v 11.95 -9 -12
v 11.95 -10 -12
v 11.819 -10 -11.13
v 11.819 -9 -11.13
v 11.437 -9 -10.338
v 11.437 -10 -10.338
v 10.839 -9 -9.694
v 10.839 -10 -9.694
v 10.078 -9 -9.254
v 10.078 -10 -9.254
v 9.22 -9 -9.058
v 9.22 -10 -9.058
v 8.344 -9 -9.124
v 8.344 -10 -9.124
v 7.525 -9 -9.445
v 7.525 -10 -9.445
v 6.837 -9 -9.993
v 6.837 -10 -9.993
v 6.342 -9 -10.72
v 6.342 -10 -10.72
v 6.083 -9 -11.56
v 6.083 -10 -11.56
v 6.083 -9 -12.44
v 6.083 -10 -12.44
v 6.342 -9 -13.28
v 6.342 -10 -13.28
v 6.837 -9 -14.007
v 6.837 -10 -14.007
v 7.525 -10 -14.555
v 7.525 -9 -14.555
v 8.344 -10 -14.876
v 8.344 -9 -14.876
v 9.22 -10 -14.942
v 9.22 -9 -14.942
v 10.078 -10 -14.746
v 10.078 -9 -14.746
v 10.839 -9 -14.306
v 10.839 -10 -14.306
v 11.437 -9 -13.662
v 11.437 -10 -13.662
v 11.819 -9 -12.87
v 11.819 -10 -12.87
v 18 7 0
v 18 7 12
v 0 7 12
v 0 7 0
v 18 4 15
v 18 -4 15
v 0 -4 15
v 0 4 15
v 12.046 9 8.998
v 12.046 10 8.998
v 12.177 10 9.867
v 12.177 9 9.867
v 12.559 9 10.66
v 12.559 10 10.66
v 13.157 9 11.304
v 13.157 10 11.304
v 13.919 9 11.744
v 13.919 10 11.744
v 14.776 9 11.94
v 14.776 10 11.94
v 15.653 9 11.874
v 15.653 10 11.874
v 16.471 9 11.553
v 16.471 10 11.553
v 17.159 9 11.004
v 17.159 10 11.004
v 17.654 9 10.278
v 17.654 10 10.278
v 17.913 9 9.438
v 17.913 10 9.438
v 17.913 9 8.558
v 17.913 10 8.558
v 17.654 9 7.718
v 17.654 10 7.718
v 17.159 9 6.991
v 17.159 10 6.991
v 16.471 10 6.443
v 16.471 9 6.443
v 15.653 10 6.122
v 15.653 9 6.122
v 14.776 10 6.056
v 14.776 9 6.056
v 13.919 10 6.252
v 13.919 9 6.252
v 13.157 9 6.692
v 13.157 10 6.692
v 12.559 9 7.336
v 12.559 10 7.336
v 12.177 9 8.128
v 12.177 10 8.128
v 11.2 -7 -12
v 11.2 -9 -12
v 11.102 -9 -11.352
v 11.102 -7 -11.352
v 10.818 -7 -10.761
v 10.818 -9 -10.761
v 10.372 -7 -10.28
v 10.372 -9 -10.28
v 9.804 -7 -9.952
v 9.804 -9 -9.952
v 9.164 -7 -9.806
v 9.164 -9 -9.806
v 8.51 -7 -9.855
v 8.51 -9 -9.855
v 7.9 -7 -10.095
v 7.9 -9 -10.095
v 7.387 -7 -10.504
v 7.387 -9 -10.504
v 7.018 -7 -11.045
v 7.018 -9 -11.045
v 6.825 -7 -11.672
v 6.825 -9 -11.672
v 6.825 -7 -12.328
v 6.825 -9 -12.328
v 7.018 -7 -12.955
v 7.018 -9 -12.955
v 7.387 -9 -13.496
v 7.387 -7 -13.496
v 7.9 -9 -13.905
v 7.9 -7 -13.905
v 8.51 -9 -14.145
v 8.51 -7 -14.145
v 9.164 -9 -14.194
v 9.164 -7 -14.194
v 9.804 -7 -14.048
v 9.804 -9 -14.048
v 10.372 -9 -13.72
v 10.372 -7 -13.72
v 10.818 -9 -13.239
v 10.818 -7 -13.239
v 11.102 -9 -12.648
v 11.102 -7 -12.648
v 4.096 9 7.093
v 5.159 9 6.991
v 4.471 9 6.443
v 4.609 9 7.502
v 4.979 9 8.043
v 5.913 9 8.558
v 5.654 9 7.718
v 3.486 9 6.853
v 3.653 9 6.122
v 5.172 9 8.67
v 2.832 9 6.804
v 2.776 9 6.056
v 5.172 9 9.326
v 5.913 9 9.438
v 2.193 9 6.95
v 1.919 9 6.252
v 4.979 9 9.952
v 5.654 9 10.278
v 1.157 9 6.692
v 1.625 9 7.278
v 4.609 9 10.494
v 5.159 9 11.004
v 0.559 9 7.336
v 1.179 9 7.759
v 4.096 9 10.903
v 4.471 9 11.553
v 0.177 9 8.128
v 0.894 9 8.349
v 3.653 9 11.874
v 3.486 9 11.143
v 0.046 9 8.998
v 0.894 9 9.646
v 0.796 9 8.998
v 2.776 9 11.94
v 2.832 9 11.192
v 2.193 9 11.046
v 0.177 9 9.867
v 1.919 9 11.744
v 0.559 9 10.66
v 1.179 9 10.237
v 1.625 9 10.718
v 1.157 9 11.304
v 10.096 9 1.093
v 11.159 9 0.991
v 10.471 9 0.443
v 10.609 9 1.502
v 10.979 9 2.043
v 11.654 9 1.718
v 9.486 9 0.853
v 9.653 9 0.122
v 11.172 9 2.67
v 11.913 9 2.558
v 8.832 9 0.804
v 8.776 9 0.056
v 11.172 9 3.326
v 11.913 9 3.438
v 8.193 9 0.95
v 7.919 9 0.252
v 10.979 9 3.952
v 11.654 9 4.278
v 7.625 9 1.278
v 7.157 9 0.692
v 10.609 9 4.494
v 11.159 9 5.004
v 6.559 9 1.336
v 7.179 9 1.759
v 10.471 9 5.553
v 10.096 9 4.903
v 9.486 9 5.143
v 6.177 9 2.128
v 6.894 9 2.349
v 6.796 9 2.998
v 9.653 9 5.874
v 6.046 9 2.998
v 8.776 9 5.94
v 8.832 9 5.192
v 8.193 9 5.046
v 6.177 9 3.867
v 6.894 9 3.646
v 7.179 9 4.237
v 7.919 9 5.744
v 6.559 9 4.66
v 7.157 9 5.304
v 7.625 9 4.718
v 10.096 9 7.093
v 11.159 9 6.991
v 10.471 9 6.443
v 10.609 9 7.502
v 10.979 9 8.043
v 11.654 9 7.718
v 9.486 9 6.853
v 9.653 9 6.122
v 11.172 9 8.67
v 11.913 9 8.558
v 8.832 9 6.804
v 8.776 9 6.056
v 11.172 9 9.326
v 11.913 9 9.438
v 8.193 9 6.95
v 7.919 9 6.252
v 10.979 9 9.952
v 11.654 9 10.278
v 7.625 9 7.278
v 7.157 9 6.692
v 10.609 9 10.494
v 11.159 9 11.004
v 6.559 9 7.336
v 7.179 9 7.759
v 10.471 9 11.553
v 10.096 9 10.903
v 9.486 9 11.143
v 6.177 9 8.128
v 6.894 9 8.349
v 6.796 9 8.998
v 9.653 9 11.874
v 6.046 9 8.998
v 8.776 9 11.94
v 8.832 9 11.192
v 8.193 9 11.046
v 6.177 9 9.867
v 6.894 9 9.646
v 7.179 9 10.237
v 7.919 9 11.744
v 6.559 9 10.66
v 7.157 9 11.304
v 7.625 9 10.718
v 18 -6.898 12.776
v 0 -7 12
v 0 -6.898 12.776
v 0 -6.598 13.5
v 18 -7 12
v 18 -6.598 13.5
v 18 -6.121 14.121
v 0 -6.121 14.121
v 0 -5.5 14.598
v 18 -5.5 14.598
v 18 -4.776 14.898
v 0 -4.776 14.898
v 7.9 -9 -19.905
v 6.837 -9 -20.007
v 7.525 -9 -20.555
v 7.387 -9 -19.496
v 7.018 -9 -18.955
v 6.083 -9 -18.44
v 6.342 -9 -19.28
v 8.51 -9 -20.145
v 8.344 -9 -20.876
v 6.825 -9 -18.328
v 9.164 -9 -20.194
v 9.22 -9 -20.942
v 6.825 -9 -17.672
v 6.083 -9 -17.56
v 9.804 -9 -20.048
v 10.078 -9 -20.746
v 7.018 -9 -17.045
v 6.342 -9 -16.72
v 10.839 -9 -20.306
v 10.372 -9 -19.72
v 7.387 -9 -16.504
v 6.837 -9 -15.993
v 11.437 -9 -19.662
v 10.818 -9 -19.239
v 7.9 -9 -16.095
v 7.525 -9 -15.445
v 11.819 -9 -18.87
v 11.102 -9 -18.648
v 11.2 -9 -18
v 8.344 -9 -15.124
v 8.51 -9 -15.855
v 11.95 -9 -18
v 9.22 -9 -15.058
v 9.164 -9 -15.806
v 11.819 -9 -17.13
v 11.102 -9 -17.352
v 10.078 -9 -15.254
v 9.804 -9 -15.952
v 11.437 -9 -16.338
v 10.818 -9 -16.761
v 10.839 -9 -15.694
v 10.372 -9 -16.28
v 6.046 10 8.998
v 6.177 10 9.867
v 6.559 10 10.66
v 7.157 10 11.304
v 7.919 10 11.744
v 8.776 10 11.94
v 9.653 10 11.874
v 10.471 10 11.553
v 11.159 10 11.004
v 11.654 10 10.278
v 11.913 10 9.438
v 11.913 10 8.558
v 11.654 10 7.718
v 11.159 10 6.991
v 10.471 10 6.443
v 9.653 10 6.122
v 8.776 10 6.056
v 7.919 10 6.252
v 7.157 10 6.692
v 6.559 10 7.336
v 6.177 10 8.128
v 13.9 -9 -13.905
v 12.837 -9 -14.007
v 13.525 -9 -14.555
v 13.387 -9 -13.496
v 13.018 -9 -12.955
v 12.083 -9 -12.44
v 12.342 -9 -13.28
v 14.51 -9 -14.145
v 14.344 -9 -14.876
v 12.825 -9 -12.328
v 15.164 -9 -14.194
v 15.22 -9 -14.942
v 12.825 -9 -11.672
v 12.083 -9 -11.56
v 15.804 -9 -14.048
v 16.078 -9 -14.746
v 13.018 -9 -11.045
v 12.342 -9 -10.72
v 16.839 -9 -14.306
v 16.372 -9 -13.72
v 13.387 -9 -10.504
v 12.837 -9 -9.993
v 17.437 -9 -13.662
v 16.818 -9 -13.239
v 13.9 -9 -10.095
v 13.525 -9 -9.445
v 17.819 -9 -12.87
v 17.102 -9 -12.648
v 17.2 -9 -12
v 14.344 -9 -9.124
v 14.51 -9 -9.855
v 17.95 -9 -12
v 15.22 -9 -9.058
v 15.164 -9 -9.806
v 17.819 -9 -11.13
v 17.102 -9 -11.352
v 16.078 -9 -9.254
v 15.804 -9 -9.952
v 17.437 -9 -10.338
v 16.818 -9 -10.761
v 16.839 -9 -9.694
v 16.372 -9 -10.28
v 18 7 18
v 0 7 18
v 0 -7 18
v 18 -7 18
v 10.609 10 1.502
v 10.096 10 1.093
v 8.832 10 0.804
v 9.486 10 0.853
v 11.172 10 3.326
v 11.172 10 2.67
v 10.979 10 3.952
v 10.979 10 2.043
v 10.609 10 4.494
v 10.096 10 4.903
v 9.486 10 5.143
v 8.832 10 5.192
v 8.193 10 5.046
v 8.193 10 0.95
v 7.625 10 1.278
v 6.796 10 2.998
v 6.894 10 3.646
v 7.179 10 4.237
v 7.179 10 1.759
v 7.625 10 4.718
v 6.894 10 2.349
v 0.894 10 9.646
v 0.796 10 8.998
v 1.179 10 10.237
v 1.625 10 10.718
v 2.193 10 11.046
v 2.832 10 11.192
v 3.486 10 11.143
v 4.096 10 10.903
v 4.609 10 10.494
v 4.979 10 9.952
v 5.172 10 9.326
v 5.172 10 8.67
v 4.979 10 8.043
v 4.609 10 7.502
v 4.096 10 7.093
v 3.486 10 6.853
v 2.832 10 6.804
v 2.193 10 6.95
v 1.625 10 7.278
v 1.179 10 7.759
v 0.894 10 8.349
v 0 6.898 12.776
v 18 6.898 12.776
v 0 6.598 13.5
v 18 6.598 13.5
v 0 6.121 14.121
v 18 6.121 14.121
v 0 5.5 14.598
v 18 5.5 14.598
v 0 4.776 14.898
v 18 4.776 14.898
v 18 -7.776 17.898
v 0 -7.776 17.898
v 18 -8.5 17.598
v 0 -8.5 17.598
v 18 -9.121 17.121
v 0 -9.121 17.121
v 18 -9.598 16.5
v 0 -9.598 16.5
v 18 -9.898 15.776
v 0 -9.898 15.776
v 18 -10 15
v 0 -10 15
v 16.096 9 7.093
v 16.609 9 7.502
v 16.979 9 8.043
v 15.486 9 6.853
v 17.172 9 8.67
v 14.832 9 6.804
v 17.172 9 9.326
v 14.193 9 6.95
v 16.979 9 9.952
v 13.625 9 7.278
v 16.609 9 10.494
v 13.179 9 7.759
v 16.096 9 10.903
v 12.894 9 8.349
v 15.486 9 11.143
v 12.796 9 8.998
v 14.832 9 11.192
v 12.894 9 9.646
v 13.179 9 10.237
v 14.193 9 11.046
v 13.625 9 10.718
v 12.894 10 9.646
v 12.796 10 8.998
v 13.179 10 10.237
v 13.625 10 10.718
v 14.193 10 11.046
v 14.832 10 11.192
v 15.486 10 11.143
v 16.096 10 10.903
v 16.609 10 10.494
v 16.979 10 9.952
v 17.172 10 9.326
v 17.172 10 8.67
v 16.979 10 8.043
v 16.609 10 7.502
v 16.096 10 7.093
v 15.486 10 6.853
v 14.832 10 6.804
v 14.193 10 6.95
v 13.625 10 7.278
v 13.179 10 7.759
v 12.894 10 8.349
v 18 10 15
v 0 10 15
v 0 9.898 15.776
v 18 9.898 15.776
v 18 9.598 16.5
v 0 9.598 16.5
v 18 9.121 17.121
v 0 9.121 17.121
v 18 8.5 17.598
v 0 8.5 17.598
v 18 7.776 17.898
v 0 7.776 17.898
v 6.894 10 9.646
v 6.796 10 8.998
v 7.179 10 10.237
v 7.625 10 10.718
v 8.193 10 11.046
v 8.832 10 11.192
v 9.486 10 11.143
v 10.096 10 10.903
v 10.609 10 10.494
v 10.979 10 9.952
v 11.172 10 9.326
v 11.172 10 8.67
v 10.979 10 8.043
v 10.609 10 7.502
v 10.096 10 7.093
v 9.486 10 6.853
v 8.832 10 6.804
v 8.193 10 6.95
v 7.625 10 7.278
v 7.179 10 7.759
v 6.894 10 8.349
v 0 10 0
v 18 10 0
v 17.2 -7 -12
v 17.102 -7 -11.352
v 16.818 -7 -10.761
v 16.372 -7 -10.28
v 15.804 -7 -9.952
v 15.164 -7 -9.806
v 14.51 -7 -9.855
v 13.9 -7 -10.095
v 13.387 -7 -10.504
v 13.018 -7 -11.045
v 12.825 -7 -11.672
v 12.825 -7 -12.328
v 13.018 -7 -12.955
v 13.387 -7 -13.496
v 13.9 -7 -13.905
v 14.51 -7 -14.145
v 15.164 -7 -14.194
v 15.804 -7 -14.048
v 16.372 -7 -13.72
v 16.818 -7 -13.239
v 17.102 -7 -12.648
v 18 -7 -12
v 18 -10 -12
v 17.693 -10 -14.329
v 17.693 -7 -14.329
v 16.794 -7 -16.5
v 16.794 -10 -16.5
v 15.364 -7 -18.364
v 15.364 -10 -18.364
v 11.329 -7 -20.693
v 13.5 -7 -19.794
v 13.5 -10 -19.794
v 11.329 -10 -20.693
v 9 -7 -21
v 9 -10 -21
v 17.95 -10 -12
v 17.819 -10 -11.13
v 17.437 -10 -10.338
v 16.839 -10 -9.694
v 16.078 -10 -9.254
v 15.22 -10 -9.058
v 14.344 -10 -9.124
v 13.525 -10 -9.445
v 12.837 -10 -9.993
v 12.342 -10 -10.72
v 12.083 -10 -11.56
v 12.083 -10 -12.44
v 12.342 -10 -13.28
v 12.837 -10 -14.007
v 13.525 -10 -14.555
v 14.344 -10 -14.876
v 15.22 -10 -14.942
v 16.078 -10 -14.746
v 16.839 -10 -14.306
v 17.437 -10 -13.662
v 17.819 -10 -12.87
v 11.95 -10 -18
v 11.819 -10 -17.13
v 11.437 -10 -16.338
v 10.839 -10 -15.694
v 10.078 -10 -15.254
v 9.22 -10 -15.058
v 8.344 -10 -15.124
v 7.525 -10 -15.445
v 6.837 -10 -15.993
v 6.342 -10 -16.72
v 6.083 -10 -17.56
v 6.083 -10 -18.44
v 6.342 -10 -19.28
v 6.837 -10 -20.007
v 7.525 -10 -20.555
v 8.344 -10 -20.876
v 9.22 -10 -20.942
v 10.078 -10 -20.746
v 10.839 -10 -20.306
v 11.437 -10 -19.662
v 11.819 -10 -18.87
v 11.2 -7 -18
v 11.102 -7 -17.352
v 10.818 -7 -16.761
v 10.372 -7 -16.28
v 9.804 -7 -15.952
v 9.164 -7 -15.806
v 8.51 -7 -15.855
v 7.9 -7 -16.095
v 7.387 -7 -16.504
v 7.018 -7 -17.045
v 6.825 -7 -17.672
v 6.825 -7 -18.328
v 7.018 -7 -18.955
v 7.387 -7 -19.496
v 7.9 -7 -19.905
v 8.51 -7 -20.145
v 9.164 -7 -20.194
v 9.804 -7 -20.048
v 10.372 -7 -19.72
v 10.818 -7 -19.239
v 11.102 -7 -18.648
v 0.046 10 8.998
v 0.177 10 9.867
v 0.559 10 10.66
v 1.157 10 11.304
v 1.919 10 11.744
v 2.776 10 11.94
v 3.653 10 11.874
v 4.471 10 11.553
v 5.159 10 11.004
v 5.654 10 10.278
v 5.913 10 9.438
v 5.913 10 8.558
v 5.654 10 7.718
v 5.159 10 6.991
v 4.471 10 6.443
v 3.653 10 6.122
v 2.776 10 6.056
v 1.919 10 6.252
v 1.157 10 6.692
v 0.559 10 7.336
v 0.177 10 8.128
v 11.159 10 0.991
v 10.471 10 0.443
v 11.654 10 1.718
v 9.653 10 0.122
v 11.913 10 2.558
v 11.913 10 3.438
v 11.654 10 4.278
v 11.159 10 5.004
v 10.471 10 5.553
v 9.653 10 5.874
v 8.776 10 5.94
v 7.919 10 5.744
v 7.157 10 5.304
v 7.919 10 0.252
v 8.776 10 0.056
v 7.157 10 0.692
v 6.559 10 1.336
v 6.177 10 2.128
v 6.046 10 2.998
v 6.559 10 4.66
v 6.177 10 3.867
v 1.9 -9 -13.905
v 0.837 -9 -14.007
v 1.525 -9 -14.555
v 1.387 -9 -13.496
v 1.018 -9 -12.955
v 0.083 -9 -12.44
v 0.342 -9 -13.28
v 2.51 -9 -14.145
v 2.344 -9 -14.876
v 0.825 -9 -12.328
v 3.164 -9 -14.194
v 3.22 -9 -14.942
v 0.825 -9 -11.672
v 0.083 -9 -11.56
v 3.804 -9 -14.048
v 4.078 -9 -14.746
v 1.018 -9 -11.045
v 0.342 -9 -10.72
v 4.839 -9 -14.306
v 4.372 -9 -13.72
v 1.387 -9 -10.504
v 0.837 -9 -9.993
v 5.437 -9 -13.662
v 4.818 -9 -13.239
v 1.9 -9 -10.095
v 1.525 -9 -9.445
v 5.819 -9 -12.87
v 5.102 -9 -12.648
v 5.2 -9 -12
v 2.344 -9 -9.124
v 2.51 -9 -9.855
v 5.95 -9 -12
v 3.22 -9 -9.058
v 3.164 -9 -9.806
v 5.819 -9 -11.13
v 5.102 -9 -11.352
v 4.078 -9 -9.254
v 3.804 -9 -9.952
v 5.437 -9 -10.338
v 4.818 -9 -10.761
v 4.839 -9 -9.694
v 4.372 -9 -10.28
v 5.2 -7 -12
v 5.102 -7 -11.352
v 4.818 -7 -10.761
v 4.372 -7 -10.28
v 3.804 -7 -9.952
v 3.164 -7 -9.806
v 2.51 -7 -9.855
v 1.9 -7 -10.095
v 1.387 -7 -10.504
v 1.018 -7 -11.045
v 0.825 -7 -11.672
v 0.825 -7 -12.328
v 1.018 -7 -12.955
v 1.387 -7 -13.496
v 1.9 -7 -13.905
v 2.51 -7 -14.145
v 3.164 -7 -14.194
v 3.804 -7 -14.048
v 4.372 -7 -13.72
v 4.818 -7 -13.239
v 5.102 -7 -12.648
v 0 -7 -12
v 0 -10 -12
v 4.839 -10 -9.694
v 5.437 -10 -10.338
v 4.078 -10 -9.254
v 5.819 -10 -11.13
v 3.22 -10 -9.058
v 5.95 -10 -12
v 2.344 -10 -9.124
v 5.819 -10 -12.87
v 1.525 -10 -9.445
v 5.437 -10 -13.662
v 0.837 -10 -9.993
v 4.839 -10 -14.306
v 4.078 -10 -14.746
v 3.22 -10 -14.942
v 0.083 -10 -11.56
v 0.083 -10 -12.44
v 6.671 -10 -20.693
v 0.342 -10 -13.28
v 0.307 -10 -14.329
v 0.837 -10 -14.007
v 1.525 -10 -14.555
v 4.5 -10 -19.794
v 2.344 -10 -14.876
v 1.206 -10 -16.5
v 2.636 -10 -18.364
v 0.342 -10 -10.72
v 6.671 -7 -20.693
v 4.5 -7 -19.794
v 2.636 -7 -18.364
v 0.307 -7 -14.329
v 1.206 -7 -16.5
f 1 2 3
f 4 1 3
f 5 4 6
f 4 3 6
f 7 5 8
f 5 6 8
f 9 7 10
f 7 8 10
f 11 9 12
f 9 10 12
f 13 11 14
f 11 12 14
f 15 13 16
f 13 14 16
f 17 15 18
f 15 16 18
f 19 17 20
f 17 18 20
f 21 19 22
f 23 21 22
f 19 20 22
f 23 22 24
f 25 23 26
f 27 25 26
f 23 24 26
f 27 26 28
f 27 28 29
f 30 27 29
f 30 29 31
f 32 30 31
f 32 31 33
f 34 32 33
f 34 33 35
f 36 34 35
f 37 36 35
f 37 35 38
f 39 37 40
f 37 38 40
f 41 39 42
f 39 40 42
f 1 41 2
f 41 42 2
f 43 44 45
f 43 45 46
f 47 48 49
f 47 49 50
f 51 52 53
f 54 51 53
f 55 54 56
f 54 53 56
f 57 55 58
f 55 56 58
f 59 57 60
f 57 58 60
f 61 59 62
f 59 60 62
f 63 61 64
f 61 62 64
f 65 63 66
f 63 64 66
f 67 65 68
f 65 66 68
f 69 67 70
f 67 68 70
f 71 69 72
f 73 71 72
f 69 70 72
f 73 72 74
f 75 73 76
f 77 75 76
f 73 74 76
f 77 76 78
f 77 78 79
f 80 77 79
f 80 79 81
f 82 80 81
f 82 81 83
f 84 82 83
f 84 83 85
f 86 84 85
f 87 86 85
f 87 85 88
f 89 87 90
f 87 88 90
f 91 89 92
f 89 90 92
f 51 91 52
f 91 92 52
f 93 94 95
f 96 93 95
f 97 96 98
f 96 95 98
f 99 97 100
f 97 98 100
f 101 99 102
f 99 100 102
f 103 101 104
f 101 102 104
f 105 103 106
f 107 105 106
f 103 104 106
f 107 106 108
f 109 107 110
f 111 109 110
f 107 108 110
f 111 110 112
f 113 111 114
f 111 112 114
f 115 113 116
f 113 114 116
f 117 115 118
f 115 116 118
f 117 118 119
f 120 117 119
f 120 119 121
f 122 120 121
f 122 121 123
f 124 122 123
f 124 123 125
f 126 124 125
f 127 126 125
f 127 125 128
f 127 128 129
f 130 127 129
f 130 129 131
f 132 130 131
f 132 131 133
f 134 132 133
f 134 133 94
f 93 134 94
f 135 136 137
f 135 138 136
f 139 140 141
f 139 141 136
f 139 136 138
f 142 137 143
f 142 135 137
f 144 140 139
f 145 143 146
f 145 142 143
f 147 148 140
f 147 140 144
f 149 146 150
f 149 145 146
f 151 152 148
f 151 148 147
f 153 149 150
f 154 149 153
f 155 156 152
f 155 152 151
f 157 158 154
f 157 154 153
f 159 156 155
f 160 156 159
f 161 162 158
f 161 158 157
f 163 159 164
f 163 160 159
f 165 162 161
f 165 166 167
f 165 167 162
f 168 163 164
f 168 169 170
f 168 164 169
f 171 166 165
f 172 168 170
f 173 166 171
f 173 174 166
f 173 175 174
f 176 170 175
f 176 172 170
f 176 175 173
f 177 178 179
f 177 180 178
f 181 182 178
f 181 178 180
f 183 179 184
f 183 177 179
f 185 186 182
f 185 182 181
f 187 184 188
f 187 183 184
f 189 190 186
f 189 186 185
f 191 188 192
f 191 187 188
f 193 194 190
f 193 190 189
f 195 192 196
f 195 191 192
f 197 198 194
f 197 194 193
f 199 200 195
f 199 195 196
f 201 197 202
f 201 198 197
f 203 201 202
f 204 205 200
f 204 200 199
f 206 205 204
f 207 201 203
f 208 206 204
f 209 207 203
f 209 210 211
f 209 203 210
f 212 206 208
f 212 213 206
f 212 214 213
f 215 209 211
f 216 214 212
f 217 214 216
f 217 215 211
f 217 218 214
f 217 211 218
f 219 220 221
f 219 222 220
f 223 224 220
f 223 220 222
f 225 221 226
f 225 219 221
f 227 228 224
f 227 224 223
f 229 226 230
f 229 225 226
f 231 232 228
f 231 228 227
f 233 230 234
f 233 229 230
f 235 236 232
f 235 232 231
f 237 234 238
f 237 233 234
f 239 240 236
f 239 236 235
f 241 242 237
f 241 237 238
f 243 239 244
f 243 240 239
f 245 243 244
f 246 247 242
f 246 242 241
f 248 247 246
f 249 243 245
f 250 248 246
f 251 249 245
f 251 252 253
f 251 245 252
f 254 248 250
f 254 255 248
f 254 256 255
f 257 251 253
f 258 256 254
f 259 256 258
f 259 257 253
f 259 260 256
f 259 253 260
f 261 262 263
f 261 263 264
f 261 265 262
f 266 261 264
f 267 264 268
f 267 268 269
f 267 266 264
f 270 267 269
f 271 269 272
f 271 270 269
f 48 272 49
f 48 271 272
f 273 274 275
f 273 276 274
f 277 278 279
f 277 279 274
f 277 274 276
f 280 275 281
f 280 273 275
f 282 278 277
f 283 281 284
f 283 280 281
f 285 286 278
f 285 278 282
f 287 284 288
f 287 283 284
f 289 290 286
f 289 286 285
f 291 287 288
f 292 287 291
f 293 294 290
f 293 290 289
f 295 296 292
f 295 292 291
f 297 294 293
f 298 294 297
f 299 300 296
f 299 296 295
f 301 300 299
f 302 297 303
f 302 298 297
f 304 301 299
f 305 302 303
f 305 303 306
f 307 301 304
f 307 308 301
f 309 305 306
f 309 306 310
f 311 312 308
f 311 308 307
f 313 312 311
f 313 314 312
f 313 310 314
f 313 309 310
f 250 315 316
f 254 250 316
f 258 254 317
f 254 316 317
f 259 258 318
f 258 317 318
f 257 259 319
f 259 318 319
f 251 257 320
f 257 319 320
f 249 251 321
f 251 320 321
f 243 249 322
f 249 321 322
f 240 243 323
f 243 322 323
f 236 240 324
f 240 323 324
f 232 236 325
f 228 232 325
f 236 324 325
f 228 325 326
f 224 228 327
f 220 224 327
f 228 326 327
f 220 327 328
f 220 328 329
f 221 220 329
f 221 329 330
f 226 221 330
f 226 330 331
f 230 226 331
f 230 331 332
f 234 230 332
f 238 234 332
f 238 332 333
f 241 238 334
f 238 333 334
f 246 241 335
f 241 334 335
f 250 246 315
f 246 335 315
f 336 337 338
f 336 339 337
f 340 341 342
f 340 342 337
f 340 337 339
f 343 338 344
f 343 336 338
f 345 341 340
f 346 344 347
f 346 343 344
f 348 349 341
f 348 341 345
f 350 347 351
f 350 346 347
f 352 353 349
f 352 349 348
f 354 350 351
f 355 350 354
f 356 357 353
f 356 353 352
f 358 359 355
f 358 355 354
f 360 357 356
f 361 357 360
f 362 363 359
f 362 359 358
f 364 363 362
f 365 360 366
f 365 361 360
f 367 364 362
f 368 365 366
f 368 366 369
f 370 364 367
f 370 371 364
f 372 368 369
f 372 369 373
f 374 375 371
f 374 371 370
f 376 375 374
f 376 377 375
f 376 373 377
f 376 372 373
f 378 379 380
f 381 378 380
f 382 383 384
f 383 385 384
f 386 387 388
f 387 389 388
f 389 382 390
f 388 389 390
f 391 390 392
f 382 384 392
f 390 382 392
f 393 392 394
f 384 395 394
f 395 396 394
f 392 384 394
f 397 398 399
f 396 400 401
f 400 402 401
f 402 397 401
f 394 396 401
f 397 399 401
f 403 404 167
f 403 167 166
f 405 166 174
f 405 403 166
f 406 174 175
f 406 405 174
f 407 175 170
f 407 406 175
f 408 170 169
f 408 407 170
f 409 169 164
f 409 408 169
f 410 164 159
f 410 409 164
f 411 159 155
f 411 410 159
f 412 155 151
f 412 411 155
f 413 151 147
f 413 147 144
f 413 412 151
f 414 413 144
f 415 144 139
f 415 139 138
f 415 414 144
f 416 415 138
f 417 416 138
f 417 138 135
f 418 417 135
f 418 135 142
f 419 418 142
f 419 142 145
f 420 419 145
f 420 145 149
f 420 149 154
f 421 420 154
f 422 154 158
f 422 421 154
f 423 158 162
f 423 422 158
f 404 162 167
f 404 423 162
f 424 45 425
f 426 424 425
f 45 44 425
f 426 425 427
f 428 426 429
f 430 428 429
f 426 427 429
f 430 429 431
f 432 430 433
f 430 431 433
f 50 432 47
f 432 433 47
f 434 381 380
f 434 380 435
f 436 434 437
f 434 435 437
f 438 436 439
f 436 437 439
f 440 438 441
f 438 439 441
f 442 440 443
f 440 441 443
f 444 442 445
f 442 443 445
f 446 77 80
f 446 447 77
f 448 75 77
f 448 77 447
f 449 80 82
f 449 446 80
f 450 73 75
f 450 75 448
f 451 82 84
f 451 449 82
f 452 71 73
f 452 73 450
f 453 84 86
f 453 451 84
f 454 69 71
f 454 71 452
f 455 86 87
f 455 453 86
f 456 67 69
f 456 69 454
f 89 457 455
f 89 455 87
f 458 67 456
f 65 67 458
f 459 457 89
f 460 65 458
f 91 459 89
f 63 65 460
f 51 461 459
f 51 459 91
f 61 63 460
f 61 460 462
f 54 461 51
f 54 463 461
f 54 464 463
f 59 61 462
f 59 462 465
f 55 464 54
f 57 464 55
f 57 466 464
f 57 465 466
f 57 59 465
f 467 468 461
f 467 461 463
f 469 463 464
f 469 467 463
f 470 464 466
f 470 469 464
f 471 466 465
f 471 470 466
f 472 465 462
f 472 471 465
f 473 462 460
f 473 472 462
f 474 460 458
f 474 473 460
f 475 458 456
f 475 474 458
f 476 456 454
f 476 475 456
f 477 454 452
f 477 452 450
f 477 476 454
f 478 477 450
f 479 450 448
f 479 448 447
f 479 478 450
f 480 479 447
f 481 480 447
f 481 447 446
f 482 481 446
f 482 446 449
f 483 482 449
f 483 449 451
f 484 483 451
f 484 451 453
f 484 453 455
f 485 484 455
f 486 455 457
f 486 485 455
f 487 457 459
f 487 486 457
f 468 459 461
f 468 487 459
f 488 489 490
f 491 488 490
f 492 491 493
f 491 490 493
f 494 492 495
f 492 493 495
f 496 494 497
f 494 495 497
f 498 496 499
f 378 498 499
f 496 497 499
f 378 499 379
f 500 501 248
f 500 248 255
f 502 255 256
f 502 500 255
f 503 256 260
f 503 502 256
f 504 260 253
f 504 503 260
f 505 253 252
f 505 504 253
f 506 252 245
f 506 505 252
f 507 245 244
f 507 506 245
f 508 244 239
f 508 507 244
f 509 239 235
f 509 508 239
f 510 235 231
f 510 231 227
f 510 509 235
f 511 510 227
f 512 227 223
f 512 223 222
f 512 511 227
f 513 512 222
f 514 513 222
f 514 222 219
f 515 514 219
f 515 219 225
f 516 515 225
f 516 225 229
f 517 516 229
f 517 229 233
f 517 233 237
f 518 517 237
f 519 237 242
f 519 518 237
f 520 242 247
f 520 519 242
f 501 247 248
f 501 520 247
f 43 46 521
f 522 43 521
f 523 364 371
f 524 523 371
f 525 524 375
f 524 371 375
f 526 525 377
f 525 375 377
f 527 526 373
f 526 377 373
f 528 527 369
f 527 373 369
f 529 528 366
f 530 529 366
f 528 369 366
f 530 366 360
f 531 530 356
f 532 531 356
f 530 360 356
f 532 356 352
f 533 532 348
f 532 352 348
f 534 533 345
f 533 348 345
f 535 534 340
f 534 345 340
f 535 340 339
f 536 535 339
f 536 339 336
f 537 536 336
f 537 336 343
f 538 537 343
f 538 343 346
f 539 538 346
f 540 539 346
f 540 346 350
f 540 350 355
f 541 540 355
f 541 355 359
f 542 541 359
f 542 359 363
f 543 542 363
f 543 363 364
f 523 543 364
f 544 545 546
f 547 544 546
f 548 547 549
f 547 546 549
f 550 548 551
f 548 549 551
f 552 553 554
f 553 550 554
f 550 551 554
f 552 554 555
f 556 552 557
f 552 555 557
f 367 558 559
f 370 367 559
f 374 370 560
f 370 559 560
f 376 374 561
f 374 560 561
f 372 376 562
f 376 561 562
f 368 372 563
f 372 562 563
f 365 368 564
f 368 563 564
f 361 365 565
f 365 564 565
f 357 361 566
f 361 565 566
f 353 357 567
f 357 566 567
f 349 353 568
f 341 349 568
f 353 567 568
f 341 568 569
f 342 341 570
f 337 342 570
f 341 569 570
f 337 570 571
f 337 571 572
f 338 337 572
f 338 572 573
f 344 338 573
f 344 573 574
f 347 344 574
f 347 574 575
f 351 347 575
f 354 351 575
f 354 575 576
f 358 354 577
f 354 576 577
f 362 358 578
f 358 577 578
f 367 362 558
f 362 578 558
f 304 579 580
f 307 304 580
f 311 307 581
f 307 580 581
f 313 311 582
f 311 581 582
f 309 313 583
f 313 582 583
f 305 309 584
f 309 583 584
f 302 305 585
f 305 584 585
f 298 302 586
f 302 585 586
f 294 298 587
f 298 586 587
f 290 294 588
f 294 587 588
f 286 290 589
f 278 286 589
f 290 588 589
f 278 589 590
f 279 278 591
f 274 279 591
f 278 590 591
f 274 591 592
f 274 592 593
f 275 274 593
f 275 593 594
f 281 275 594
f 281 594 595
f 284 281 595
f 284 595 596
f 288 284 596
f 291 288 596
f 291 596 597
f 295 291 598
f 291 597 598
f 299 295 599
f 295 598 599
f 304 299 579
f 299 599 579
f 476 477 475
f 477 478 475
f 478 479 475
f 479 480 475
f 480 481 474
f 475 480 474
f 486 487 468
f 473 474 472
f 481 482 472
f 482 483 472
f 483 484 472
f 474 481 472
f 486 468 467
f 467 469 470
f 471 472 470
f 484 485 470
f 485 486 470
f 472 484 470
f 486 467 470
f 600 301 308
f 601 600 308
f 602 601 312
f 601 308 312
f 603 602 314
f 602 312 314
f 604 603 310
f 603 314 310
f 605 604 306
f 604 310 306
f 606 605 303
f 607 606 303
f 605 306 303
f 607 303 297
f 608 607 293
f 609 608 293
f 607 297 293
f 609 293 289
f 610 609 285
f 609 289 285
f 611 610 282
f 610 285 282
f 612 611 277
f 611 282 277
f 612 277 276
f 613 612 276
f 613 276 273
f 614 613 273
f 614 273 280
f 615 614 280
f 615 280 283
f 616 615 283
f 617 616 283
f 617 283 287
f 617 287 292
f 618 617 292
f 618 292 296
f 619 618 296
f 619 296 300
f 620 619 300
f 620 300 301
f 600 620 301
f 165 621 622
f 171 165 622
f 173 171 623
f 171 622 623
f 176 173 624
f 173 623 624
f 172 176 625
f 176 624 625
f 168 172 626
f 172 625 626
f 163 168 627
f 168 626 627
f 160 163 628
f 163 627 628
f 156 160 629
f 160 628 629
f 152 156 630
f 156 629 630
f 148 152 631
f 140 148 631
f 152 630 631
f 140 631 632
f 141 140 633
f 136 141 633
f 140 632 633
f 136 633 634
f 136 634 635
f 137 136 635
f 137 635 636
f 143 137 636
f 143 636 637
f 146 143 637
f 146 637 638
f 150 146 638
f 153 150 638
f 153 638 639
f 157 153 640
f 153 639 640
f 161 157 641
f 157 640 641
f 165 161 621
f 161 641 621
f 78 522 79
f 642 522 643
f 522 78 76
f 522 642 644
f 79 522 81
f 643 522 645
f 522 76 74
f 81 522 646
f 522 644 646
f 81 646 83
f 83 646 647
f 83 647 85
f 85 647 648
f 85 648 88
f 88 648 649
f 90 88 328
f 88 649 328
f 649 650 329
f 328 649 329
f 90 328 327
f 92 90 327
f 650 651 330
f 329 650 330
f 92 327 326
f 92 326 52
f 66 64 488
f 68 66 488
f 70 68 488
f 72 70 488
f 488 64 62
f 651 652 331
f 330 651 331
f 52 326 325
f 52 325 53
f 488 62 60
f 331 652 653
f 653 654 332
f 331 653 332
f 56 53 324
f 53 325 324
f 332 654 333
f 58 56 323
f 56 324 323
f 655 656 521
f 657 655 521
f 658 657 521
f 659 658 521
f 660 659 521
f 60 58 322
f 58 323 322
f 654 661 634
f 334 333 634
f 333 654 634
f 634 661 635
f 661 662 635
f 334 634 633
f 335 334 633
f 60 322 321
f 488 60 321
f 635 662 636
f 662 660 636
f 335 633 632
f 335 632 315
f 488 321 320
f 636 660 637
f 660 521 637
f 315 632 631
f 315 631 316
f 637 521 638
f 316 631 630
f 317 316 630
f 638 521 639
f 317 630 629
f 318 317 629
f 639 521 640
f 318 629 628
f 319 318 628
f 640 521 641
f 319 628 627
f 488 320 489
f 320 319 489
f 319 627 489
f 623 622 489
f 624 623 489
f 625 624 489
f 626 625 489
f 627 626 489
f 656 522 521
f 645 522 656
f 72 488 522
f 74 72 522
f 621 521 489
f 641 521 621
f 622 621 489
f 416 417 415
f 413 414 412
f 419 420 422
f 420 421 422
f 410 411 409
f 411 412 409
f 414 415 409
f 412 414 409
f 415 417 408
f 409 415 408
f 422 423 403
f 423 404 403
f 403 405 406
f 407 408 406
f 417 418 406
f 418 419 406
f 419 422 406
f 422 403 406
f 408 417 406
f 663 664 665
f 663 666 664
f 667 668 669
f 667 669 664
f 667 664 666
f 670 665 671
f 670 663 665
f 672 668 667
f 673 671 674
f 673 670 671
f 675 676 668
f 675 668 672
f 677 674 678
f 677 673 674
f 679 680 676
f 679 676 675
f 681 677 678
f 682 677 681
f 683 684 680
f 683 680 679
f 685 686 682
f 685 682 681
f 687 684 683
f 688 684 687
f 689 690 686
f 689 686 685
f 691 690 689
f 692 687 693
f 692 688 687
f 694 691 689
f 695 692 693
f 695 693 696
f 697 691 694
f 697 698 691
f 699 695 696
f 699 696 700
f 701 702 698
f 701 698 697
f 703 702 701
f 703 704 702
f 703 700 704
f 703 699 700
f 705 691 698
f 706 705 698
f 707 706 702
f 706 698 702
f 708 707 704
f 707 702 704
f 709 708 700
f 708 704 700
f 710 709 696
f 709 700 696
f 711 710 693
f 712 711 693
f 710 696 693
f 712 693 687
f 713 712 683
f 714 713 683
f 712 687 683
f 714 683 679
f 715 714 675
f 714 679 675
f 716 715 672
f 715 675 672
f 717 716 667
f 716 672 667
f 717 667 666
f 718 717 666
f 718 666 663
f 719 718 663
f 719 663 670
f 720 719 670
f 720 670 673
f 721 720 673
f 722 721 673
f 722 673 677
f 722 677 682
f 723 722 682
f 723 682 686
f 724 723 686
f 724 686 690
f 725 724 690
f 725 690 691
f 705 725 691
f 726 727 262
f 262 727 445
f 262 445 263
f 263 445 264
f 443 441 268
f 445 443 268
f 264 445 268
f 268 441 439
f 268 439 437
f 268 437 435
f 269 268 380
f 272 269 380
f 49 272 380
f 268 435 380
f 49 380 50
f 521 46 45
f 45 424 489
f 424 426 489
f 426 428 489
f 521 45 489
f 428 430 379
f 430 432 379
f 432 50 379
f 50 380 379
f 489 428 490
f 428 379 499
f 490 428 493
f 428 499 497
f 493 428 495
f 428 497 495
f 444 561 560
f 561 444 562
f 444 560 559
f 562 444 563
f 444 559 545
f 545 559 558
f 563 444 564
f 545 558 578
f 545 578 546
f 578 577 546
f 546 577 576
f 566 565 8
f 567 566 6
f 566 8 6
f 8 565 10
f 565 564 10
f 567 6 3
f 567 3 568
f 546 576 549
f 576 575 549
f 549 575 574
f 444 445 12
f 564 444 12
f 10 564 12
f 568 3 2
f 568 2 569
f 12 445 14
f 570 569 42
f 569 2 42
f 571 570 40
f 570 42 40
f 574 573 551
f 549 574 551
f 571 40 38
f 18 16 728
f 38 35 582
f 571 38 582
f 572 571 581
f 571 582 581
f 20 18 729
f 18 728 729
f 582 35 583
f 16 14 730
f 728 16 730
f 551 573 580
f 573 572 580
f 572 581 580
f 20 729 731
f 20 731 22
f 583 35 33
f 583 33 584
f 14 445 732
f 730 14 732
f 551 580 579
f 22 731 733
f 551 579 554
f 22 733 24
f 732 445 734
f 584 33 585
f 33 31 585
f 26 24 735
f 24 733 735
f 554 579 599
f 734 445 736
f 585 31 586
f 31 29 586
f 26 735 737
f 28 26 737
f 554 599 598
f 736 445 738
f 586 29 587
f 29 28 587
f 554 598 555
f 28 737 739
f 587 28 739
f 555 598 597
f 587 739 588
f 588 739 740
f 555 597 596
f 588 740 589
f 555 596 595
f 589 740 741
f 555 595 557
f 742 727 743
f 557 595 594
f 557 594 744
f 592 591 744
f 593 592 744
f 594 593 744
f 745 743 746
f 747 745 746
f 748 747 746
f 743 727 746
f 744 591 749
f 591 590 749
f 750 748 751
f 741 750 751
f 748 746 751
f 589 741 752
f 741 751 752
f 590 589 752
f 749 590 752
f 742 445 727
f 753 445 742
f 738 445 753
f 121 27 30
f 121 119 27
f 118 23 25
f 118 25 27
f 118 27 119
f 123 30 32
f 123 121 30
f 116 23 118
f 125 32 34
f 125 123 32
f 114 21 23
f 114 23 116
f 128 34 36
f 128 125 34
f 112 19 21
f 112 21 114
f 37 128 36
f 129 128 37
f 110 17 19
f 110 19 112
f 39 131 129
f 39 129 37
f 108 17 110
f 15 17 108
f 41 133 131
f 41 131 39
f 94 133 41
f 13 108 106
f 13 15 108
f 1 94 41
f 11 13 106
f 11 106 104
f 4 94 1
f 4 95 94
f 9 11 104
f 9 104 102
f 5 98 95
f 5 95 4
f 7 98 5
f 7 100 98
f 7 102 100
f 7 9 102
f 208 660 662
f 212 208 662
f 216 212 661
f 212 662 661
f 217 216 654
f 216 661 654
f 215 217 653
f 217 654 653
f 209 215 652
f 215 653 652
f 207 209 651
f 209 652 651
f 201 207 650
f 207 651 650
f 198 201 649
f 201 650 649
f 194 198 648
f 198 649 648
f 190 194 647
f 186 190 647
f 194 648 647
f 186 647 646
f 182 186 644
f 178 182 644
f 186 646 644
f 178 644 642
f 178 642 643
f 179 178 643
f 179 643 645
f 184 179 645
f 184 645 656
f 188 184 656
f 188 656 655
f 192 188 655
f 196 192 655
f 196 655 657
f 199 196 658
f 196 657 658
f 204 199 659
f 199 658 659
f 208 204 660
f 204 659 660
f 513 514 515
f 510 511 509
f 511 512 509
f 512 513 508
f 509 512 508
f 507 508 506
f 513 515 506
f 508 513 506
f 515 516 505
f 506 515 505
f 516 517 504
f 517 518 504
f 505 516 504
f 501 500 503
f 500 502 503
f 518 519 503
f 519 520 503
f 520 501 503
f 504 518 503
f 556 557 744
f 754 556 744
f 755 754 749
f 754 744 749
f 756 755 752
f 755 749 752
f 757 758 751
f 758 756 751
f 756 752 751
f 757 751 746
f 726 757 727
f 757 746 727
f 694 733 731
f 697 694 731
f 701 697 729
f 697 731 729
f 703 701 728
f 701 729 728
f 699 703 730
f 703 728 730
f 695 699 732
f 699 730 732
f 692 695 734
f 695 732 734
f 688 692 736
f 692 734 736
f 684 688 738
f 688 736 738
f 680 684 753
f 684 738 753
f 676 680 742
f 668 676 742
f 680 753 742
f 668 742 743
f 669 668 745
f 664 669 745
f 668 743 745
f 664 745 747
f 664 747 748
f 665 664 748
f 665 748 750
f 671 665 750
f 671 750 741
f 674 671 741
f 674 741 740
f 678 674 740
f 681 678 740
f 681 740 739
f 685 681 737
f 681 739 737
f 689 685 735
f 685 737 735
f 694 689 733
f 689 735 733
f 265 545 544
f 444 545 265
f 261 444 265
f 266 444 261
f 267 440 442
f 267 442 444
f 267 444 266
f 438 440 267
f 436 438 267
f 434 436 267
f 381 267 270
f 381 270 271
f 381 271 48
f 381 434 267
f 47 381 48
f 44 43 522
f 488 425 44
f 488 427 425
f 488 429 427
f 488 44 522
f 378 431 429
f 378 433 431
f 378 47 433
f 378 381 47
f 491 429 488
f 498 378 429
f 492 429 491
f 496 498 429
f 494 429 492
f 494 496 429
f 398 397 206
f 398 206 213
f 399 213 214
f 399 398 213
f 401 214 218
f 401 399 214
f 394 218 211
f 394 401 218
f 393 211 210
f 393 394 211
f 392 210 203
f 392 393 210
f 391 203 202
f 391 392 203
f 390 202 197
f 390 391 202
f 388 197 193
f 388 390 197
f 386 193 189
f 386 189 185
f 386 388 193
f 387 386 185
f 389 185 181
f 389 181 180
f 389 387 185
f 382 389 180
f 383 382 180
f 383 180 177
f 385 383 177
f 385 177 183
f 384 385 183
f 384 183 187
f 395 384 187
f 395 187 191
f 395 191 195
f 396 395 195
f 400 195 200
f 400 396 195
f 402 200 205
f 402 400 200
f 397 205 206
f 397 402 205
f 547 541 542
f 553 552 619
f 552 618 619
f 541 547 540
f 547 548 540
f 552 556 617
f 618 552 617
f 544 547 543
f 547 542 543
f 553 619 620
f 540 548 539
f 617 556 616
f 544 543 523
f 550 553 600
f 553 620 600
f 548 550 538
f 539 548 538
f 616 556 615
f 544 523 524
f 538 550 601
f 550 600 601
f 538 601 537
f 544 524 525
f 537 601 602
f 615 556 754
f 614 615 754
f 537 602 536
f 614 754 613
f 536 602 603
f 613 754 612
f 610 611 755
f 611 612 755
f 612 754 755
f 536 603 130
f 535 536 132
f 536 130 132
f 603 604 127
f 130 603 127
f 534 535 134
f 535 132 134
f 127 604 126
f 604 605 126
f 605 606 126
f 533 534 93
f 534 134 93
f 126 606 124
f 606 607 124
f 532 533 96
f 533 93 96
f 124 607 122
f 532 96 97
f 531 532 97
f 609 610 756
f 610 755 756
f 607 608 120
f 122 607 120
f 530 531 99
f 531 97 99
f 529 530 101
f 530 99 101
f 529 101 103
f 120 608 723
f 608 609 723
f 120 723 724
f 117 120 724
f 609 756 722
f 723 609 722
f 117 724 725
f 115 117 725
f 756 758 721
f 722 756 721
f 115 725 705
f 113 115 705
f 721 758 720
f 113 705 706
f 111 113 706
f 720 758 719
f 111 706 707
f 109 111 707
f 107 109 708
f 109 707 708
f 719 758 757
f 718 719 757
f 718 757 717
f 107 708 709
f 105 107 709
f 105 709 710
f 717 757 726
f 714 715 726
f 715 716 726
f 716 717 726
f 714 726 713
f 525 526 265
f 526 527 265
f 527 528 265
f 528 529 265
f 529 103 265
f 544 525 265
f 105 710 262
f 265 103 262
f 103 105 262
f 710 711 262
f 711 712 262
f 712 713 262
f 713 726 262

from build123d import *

# Parameters (mm, degrees)
F1_DEPTH = 18
F2_R     = 2.95
F2_R_2   = 2.2
F3_DEPTH = 1
F4_R     = 3
F5_R     = 2.2
F6_DEPTH = 20.001
F5_R_2   = 2.95
F7_DEPTH = 1


with BuildPart() as f1:
    # F0 (on Right) → F1 (new body)
    with BuildSketch(Plane.YZ):
        with BuildLine():
            Line((10, 0), (10, 15))
            ThreePointArc((10, 15), (9.1213203436, 17.1213203436), (7, 18))
            Line((7, 18), (-7, 18))
            ThreePointArc((-7, 18), (-9.1213203436, 17.1213203436), (-10, 15))
            Line((-10, 15), (-10, -21))
            Line((-10, -21), (-7, -21))
            Line((-7, -21), (-7, 15))
            Line((-7, 15), (7, 15))
            Line((7, 15), (7, 0))
            Line((7, 0), (10, 0))
        make_face()
    extrude(amount=F1_DEPTH)

    # F2 (on face) → F3 (cut)
    with BuildSketch(Plane(origin=(0, 10, 0), x_dir=(-1, 0, 0), z_dir=(0, 1, 0))):
        with Locations((-14.9964041635, 8.9979103986)):
            Circle(F2_R)
        with Locations((-14.9964041635, 8.9979103986)):
            Circle(F2_R_2, mode=Mode.SUBTRACT)
        with Locations((-8.9964041635, 8.9979103986)):
            Circle(F2_R)
        with Locations((-8.9964041635, 8.9979103986)):
            Circle(F2_R_2, mode=Mode.SUBTRACT)
        with Locations((-2.9964041635, 8.9979103986)):
            Circle(F2_R)
        with Locations((-2.9964041635, 8.9979103986)):
            Circle(F2_R_2, mode=Mode.SUBTRACT)
        with Locations((-8.9964041635, 2.9979103986)):
            Circle(F2_R)
        with Locations((-8.9964041635, 2.9979103986)):
            Circle(F2_R_2, mode=Mode.SUBTRACT)
    extrude(amount=-F3_DEPTH, mode=Mode.SUBTRACT)

    # F4
    f4_edges = [f1.edges().sort_by_distance(p)[0] for p in [
        (9, 7, 15),
        (9, -7, 15),
    ]]
    fillet(f4_edges, radius=F4_R)

    # F5 (on face) → F6 (cut, through all)
    with BuildSketch(Plane.XZ.offset(10)):
        with BuildLine():
            ThreePointArc((18, -12), (15.3639610307, -18.3639610307), (9, -21))
            Line((9, -21), (18, -21))
            Line((18, -21), (18, -12))
        make_face()
        with BuildLine():
            ThreePointArc((9, -21), (2.6360389693, -18.3639610307), (0, -12))
            Line((0, -12), (0, -21))
            Line((0, -21), (9, -21))
        make_face()
        with Locations((3, -12)):
            Circle(F5_R)
        with Locations((9, -12)):
            Circle(F5_R)
        with Locations((15, -12)):
            Circle(F5_R)
        with Locations((9, -18)):
            Circle(F5_R)
    extrude(amount=-F6_DEPTH, mode=Mode.SUBTRACT)

    # F5 (on face) → F7 (cut)
    with BuildSketch(Plane.XZ.offset(10)):
        with Locations((3, -12)):
            Circle(F5_R_2)
        with Locations((3, -12)):
            Circle(F5_R, mode=Mode.SUBTRACT)
        with Locations((9, -12)):
            Circle(F5_R_2)
        with Locations((9, -12)):
            Circle(F5_R, mode=Mode.SUBTRACT)
        with Locations((15, -12)):
            Circle(F5_R_2)
        with Locations((15, -12)):
            Circle(F5_R, mode=Mode.SUBTRACT)
        with Locations((9, -18)):
            Circle(F5_R_2)
        with Locations((9, -18)):
            Circle(F5_R, mode=Mode.SUBTRACT)
    extrude(amount=-F7_DEPTH, mode=Mode.SUBTRACT)


solid = f1.part
